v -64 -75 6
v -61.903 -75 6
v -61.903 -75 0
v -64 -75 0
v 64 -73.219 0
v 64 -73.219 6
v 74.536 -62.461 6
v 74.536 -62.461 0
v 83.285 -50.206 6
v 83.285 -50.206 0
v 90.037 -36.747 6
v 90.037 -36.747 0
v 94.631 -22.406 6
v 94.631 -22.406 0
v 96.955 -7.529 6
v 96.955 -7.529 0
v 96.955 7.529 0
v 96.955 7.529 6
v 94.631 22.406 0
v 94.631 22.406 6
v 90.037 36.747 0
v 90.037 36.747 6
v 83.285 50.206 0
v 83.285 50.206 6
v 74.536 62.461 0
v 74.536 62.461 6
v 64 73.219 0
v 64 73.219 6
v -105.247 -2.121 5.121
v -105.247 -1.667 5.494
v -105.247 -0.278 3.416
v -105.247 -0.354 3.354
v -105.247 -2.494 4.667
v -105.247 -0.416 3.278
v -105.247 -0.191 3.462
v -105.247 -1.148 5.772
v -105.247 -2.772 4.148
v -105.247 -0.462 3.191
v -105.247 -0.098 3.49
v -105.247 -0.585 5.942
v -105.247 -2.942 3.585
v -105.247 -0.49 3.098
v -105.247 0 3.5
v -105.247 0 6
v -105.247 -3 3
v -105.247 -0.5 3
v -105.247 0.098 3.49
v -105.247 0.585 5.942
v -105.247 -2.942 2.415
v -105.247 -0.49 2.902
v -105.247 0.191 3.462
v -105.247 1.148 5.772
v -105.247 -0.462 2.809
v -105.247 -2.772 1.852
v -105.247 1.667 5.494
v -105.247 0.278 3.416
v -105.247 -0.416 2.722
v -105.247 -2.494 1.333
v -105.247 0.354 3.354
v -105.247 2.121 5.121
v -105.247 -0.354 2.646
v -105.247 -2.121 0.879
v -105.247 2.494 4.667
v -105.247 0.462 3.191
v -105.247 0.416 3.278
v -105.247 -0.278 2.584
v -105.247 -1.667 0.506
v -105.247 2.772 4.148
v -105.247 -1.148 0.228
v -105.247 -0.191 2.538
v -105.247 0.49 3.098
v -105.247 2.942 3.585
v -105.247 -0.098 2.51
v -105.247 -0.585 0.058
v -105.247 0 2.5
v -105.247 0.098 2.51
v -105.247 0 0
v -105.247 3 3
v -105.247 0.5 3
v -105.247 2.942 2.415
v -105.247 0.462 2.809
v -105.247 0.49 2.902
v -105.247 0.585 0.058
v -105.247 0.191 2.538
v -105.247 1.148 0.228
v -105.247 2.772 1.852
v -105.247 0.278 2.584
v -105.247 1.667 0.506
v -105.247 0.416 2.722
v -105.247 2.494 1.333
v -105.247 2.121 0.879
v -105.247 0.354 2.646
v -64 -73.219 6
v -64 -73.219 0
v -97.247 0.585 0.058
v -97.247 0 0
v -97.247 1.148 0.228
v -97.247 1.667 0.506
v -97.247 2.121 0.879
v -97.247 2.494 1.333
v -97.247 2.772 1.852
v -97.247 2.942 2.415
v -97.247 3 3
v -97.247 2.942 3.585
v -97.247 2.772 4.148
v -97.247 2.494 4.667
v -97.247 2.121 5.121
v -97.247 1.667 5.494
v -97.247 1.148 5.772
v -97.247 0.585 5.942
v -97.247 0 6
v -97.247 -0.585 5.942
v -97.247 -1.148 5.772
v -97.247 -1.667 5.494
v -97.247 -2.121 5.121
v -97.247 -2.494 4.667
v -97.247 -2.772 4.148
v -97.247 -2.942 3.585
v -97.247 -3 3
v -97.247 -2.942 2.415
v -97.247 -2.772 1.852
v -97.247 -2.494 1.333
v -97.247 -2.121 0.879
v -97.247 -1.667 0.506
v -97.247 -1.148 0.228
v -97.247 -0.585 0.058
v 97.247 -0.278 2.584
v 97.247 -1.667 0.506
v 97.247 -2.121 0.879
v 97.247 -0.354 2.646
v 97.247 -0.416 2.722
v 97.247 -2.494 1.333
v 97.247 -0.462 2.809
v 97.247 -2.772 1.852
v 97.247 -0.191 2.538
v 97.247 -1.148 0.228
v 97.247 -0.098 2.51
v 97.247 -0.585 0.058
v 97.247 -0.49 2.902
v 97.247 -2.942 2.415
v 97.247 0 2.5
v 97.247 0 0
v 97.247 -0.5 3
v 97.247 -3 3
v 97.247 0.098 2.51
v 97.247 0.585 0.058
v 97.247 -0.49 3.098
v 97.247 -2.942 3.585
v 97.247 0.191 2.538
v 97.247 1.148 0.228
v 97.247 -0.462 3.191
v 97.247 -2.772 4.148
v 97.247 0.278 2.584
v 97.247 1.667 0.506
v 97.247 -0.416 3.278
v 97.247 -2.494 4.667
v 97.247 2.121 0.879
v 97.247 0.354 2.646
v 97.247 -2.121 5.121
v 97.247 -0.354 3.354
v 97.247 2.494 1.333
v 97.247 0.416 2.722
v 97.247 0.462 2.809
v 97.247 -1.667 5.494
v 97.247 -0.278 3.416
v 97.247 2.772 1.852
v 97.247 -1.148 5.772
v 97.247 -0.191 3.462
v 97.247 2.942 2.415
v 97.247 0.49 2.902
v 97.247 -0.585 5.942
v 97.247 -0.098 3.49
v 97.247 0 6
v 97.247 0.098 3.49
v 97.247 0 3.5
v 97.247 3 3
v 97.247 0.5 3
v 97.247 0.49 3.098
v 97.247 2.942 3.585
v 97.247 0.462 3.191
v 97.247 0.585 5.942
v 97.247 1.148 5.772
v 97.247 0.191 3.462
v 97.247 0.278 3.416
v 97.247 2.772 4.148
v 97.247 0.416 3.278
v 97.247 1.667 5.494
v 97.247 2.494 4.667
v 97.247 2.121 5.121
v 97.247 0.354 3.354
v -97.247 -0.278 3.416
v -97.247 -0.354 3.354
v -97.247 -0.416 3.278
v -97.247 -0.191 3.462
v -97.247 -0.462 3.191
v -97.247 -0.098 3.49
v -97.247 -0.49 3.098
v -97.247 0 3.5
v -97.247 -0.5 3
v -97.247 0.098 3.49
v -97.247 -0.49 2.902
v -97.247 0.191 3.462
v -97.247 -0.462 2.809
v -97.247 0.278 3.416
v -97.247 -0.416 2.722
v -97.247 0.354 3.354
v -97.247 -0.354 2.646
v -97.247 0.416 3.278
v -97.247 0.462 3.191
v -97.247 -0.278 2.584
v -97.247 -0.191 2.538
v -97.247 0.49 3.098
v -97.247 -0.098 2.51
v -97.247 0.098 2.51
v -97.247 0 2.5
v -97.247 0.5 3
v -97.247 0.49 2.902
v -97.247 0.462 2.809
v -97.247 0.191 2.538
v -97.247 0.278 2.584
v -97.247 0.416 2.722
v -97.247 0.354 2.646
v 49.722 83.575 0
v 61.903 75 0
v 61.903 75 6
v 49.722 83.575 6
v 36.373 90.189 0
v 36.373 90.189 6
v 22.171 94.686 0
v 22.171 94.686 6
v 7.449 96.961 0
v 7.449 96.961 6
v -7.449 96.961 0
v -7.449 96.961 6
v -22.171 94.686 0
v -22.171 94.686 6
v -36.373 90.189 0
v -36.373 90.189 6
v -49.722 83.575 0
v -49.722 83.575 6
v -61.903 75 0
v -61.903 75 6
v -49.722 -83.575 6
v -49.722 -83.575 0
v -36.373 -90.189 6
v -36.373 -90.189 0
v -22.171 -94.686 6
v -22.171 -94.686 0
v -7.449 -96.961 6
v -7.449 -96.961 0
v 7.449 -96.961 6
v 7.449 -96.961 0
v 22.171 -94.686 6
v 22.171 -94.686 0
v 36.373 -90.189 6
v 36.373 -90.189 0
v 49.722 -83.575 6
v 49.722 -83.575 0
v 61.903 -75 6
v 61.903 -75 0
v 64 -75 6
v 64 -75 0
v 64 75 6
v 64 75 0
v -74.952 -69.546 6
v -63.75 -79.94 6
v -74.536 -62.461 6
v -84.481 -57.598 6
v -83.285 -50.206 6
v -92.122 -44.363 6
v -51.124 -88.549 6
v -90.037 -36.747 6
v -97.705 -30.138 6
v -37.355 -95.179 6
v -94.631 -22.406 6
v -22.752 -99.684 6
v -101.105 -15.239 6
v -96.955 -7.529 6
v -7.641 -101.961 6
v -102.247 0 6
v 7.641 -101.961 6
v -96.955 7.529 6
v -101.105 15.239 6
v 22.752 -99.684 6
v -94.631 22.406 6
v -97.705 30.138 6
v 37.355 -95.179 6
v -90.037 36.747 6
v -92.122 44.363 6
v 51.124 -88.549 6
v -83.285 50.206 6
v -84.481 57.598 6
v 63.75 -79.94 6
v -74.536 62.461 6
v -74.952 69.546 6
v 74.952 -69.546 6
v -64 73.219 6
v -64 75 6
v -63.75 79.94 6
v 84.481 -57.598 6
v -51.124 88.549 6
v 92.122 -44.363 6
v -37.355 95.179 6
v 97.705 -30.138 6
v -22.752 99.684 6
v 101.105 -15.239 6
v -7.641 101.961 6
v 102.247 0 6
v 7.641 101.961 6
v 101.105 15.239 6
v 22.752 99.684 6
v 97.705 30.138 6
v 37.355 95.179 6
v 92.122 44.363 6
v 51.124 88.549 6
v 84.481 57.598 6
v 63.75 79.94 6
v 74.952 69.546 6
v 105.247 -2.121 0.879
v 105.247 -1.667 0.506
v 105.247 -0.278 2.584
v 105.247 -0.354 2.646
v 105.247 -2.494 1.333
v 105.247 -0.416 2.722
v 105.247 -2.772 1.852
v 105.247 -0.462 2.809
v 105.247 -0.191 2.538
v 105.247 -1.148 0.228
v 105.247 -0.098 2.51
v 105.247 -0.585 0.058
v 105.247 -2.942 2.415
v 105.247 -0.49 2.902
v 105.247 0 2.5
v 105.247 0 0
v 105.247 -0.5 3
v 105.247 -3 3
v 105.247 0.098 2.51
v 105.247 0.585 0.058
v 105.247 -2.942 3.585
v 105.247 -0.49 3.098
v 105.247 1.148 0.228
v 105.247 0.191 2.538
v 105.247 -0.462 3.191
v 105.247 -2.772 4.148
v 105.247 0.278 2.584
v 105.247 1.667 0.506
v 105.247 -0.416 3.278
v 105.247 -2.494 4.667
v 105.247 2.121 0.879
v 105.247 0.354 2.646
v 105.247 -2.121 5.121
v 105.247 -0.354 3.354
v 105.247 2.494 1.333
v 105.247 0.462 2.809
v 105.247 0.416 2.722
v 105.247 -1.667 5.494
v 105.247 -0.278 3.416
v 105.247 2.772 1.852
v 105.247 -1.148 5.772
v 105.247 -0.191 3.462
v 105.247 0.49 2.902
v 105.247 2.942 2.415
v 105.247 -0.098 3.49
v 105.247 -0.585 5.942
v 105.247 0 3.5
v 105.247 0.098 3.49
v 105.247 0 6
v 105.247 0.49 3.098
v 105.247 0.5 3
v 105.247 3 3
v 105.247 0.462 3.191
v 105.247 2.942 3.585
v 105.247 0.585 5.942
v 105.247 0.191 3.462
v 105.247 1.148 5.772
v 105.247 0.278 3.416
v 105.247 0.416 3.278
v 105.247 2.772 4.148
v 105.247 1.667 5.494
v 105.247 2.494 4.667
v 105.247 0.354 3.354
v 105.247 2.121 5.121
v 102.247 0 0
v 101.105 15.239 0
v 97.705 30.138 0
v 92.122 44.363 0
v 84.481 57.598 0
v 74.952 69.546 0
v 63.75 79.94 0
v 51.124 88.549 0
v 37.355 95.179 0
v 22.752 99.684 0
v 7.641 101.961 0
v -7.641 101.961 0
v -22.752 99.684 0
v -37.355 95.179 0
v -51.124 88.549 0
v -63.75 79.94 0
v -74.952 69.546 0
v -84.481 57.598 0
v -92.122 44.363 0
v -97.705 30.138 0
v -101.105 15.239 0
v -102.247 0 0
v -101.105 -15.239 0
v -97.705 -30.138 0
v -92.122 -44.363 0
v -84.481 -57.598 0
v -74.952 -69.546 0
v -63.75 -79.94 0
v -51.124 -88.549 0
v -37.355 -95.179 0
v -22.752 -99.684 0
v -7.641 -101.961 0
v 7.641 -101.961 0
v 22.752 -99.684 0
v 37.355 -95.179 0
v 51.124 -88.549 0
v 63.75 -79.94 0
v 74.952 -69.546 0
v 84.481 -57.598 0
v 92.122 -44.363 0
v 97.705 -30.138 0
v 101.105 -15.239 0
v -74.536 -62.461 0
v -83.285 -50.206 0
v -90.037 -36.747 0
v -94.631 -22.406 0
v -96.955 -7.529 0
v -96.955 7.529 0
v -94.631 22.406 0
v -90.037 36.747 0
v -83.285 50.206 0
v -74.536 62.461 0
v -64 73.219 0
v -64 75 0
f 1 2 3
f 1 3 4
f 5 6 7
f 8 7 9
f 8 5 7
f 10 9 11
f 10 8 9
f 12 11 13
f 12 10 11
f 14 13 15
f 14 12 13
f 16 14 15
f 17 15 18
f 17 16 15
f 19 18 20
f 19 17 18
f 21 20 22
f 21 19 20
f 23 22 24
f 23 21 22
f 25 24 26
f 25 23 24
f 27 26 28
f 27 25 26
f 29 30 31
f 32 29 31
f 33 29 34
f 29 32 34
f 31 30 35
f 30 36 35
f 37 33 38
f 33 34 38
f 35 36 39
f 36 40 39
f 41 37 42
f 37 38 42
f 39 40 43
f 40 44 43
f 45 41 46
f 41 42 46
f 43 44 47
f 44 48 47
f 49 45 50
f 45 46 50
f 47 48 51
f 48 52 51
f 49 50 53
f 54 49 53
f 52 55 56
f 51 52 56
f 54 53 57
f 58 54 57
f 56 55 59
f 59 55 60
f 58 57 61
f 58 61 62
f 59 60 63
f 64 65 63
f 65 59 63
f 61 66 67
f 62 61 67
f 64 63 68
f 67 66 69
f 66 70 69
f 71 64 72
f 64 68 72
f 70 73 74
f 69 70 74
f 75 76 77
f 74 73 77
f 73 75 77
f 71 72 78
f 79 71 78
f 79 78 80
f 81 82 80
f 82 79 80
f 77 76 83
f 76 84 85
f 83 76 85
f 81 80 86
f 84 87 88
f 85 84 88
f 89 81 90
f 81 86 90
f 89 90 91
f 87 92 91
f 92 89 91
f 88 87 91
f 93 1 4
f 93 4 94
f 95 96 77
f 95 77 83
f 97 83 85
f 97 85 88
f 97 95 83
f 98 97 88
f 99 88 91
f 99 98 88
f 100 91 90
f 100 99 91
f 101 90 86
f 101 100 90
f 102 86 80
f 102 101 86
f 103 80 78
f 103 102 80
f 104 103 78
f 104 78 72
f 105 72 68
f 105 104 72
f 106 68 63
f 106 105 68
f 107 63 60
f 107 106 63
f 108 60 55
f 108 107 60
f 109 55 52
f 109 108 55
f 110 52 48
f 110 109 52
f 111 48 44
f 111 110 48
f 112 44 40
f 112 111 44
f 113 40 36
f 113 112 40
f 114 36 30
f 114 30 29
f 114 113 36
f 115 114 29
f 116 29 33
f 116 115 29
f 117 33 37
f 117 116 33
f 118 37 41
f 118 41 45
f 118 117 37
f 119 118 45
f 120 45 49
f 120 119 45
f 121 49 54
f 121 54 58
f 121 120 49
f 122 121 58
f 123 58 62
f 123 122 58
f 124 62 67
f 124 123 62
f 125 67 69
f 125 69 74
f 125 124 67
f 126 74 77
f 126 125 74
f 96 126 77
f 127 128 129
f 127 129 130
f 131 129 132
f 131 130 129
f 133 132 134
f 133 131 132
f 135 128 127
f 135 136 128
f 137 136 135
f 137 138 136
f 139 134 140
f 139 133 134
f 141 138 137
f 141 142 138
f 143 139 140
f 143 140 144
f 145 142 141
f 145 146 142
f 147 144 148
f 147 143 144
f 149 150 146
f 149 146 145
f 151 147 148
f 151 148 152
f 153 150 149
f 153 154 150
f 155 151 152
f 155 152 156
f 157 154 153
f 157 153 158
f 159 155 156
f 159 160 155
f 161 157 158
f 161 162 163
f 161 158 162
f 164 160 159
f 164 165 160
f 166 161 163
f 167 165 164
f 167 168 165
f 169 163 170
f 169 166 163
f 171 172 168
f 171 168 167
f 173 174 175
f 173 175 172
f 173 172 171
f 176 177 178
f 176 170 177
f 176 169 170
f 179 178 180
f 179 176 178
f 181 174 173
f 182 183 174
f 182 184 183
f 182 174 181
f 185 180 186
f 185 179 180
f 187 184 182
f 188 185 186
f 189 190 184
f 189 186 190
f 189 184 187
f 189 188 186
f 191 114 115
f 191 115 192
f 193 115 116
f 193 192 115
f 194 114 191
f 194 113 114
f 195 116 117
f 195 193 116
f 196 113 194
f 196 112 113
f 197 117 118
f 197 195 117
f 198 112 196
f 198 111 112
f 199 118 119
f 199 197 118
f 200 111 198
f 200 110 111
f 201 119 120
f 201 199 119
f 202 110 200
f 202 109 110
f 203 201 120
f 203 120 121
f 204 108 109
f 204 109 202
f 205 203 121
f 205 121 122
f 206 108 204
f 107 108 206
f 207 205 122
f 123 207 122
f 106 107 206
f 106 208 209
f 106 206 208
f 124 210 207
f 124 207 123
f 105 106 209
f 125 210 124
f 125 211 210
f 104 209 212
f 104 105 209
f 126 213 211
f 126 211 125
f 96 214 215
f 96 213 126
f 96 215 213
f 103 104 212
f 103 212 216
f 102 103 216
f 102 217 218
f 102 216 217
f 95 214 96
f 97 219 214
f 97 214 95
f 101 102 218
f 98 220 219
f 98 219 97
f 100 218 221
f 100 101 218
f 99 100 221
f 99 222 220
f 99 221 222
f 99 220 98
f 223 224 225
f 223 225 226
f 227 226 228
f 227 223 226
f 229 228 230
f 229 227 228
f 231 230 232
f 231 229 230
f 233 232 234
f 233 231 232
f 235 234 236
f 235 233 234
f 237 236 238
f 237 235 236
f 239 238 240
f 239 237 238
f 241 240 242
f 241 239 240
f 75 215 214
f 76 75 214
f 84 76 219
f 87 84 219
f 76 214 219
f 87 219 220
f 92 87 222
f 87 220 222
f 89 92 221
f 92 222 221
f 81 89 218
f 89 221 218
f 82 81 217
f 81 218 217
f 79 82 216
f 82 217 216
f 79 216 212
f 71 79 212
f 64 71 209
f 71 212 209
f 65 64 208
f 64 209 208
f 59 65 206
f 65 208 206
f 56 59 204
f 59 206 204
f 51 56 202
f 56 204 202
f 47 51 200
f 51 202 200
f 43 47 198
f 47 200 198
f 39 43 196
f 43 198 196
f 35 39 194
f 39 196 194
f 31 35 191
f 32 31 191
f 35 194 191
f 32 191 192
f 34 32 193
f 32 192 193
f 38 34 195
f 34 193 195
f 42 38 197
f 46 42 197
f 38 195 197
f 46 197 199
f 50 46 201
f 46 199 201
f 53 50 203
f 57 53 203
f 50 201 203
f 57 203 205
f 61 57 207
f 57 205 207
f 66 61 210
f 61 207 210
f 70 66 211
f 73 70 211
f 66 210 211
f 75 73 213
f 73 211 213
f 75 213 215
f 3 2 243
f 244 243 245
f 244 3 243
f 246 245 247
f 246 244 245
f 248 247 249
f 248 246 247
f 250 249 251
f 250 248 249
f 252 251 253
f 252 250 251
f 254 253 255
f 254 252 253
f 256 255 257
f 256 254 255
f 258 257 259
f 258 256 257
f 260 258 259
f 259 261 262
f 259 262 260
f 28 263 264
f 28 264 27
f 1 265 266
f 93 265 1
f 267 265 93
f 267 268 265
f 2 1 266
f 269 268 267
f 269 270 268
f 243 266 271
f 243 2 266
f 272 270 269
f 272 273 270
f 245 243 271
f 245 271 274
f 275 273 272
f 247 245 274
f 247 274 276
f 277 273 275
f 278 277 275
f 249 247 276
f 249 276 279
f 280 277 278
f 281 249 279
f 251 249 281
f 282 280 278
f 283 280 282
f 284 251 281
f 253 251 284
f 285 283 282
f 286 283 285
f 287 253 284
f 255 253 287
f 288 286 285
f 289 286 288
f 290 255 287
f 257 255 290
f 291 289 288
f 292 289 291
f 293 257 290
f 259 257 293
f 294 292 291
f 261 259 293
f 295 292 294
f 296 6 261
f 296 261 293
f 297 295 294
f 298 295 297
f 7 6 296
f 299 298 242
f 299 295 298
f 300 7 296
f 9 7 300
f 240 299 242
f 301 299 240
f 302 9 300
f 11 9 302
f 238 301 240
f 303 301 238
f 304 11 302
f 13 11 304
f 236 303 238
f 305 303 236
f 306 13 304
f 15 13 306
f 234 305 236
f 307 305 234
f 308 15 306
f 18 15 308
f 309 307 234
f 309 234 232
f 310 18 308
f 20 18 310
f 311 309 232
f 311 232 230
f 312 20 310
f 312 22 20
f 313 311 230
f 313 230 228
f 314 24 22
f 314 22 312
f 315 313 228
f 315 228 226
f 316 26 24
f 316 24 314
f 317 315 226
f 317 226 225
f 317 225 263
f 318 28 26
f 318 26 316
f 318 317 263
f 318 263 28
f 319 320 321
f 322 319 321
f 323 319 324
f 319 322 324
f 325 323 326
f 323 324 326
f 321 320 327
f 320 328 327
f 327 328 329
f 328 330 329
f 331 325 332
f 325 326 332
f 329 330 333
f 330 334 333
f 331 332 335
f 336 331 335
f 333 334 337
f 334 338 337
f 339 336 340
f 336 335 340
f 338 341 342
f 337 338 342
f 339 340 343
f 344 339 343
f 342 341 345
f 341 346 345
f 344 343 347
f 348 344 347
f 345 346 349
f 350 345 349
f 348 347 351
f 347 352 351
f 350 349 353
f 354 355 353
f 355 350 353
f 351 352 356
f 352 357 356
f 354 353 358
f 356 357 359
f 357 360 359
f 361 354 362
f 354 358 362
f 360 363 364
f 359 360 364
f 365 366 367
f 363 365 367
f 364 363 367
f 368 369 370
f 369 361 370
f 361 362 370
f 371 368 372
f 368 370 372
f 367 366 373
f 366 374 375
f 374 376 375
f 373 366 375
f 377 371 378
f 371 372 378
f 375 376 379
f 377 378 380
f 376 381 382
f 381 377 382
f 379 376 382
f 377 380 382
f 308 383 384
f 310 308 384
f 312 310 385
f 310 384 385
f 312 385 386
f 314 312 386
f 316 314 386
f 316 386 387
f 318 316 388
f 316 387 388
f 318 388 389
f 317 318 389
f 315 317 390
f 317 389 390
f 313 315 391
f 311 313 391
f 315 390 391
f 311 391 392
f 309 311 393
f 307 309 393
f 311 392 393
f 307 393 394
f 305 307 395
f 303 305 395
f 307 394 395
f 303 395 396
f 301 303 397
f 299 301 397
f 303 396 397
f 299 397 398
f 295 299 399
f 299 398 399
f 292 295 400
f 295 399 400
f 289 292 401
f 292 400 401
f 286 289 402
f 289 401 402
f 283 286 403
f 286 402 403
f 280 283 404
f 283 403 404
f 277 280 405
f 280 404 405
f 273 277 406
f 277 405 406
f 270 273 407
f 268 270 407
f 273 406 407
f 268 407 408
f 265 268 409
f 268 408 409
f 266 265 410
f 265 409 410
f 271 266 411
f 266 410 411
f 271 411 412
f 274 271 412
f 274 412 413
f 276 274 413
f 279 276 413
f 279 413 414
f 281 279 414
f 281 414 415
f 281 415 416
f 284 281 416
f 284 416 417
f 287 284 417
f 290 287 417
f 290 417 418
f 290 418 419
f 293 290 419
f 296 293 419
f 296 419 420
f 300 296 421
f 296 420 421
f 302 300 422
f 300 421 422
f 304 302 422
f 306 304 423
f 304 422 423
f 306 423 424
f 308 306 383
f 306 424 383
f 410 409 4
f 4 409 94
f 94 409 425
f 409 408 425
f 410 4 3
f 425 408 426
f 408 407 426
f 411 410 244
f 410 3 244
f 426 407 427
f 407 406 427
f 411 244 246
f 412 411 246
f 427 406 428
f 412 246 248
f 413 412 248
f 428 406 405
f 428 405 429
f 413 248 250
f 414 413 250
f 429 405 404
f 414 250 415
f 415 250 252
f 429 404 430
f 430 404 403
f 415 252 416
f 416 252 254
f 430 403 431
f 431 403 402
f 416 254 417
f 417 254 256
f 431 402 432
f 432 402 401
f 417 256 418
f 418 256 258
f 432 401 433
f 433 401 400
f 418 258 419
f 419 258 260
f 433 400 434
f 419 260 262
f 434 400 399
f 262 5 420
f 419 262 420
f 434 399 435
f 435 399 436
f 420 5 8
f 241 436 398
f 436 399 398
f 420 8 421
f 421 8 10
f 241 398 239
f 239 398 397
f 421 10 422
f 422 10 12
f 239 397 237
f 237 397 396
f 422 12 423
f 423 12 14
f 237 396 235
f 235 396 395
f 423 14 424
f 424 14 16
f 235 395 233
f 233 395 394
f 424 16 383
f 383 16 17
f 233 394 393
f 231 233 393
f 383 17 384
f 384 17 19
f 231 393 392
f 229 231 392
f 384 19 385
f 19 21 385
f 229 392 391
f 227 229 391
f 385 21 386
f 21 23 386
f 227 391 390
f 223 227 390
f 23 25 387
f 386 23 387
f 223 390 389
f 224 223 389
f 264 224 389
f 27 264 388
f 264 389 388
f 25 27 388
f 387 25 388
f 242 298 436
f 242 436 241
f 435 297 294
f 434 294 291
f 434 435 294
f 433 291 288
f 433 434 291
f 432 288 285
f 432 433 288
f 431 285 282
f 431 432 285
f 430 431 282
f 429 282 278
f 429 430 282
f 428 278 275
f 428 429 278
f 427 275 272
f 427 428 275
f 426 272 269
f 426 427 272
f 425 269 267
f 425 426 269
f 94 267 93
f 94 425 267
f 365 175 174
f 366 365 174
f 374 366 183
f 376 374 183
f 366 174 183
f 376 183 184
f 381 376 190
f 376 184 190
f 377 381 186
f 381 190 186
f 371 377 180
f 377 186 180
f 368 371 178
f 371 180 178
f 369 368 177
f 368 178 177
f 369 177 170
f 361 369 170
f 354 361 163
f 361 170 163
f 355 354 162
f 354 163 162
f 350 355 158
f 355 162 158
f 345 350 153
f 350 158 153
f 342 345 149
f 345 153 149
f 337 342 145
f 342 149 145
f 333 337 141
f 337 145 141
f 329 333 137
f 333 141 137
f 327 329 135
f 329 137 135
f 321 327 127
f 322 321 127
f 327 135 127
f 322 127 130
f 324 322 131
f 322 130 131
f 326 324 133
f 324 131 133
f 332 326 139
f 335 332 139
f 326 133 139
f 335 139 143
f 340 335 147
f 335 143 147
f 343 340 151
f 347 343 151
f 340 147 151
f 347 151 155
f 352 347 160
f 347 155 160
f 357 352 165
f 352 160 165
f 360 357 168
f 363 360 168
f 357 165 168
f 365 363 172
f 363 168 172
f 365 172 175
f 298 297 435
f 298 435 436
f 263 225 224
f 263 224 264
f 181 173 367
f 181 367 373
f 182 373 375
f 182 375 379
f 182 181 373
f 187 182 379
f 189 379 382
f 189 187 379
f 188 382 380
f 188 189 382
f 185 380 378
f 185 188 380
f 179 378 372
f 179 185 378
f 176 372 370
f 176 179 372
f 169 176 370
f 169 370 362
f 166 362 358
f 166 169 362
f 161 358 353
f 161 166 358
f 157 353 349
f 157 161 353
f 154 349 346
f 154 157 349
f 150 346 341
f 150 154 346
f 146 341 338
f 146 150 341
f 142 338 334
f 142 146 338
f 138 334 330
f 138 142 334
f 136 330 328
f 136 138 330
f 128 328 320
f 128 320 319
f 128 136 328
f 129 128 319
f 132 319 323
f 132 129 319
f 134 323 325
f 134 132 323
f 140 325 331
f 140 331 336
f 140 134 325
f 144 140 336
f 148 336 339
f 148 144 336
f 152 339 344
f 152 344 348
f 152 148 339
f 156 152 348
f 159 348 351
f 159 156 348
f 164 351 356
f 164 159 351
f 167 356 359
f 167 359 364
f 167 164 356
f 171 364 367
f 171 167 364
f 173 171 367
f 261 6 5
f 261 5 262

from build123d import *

# Parameters (mm, degrees)
SKETCH1_R           = 102.24716621
SKETCH1_R_2         = 97.24716621
BOSS_EXTRUDE1_DEPTH = 6
SKETCH3_R           = 3
SKETCH3_R_2         = 0.5
BOSS_EXTRUDE2_DEPTH = 8
SKETCH4_R           = 3
SKETCH4_R_2         = 0.5
BOSS_EXTRUDE3_DEPTH = 8
CUT_EXTRUDE3_DEPTH  = 10


with BuildPart() as part:
    # Sketch1 → Boss-Extrude1 (new body)
    with BuildSketch(Plane.XY):
        Circle(SKETCH1_R)
        Circle(SKETCH1_R_2, mode=Mode.SUBTRACT)
    extrude(amount=BOSS_EXTRUDE1_DEPTH)

    # Sketch5 → Cut-Extrude3 (cut)
    with BuildSketch(Plane.XY.offset(6)):
        Polygon((-64, 73.218927443), (-64, 75), (-61.903241723, 75), align=None)
        Polygon((64, 73.218927443), (61.903241723, 75), (64, 75), align=None)
        Polygon((64, -75), (61.903241723, -75), (64, -73.218927443), align=None)
        Polygon((-64, -73.218927443), (-61.903241723, -75), (-64, -75), align=None)
    extrude(amount=-CUT_EXTRUDE3_DEPTH, mode=Mode.SUBTRACT)


with BuildPart() as body_2:
    # Sketch3 → Boss-Extrude2 (new body)
    with BuildSketch(Plane(origin=(-97.24716621, 0, 0), x_dir=(0, 0, -1), z_dir=(1, 0, 0))):
        with Locations((-3, 0)):
            Circle(SKETCH3_R)
        with Locations((-3, 0)):
            Circle(SKETCH3_R_2, mode=Mode.SUBTRACT)
    extrude(amount=-BOSS_EXTRUDE2_DEPTH)


with BuildPart() as body_3:
    # Sketch4 → Boss-Extrude3 (new body)
    with BuildSketch(Plane.ZY.offset(-97.24716621)):
        with Locations((3, 0)):
            Circle(SKETCH4_R)
        with Locations((3, 0)):
            Circle(SKETCH4_R_2, mode=Mode.SUBTRACT)
    extrude(amount=-BOSS_EXTRUDE3_DEPTH)


solid = Compound([part.part, body_2.part, body_3.part])
